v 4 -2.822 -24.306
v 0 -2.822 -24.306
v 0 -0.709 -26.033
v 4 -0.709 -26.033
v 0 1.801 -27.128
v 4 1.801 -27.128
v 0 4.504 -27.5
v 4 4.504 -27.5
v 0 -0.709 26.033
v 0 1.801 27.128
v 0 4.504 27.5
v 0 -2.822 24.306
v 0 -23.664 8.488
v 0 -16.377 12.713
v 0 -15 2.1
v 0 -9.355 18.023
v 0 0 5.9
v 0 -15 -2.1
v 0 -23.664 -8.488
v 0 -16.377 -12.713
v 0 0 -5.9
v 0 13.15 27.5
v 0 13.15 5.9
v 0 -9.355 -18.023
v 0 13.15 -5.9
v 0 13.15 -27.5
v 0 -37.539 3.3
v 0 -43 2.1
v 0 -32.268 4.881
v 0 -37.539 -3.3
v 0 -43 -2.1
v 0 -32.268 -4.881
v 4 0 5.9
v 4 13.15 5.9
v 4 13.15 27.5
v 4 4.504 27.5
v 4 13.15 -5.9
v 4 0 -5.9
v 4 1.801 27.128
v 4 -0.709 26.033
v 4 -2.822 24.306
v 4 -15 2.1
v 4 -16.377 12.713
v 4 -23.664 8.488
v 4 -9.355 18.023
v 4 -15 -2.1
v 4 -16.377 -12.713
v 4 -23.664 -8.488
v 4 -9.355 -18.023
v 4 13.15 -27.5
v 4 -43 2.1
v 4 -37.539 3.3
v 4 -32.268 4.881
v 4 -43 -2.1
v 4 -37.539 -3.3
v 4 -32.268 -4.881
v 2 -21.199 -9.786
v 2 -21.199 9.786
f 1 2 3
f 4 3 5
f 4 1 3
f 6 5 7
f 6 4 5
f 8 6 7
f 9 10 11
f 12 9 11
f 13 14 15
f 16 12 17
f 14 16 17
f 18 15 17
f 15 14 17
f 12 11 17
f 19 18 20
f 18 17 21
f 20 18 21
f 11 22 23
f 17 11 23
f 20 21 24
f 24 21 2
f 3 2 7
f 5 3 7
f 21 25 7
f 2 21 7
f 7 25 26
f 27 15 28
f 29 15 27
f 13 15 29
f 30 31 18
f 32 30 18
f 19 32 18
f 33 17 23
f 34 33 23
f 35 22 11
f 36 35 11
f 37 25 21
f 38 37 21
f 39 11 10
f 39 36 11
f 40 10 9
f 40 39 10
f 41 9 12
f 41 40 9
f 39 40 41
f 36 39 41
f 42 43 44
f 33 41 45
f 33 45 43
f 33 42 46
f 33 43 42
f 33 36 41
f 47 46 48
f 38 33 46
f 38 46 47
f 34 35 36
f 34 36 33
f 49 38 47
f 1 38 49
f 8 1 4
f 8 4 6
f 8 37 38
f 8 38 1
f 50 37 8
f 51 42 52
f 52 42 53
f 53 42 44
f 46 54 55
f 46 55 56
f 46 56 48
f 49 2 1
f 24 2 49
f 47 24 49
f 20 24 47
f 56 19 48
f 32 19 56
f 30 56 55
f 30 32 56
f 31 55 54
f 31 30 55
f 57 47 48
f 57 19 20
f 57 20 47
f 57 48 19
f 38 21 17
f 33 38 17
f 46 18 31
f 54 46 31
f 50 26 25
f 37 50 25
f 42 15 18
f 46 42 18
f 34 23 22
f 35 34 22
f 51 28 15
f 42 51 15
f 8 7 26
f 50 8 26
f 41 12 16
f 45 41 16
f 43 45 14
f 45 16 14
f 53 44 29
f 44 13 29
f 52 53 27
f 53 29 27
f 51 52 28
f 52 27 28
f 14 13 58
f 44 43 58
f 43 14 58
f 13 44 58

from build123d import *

# Parameters (mm, degrees)
BOSS_EXTRU_1_DEPTH = 4
CONG_1_R           = 10


with BuildPart() as part:
    # Esquisse1 → Boss.-Extru.1 (new body)
    with BuildSketch(Plane(origin=(0, 0, 0), x_dir=(0, 0, -1), z_dir=(1, 0, 0))):
        with BuildLine():
            Line((-27.5, 13.15), (-27.5, 0))
            add(Edge.make_bspline(
                [(-27.5, 0), (-6.736181912, -17.460350191), (-2.1, -43)],
                knots=[0, 0, 0, 1, 1, 1], degree=2))
            Line((-2.1, -43), (-2.1, -15))
            Line((-2.1, -15), (2.1, -15))
            Line((2.1, -15), (2.1, -43))
            add(Edge.make_bspline(
                [(27.5, 0), (6.736181912, -17.460350191), (2.1, -43)],
                knots=[0, 0, 0, 1, 1, 1], degree=2))
            Line((27.5, 0), (27.5, 13.15))
            Line((27.5, 13.15), (5.9, 13.15))
            Line((5.9, 13.15), (5.9, 0))
            Line((5.9, 0), (-5.9, 0))
            Line((-5.9, 0), (-5.9, 13.15))
            Line((-5.9, 13.15), (-27.5, 13.15))
        make_face()
    extrude(amount=BOSS_EXTRU_1_DEPTH)

    # Congé1
    cong_1_edges = [part.edges().sort_by_distance(p)[0] for p in [
        (2, 0, -27.5),
        (2, 0, 27.5),
    ]]
    fillet(cong_1_edges, radius=CONG_1_R)


solid = part.part
